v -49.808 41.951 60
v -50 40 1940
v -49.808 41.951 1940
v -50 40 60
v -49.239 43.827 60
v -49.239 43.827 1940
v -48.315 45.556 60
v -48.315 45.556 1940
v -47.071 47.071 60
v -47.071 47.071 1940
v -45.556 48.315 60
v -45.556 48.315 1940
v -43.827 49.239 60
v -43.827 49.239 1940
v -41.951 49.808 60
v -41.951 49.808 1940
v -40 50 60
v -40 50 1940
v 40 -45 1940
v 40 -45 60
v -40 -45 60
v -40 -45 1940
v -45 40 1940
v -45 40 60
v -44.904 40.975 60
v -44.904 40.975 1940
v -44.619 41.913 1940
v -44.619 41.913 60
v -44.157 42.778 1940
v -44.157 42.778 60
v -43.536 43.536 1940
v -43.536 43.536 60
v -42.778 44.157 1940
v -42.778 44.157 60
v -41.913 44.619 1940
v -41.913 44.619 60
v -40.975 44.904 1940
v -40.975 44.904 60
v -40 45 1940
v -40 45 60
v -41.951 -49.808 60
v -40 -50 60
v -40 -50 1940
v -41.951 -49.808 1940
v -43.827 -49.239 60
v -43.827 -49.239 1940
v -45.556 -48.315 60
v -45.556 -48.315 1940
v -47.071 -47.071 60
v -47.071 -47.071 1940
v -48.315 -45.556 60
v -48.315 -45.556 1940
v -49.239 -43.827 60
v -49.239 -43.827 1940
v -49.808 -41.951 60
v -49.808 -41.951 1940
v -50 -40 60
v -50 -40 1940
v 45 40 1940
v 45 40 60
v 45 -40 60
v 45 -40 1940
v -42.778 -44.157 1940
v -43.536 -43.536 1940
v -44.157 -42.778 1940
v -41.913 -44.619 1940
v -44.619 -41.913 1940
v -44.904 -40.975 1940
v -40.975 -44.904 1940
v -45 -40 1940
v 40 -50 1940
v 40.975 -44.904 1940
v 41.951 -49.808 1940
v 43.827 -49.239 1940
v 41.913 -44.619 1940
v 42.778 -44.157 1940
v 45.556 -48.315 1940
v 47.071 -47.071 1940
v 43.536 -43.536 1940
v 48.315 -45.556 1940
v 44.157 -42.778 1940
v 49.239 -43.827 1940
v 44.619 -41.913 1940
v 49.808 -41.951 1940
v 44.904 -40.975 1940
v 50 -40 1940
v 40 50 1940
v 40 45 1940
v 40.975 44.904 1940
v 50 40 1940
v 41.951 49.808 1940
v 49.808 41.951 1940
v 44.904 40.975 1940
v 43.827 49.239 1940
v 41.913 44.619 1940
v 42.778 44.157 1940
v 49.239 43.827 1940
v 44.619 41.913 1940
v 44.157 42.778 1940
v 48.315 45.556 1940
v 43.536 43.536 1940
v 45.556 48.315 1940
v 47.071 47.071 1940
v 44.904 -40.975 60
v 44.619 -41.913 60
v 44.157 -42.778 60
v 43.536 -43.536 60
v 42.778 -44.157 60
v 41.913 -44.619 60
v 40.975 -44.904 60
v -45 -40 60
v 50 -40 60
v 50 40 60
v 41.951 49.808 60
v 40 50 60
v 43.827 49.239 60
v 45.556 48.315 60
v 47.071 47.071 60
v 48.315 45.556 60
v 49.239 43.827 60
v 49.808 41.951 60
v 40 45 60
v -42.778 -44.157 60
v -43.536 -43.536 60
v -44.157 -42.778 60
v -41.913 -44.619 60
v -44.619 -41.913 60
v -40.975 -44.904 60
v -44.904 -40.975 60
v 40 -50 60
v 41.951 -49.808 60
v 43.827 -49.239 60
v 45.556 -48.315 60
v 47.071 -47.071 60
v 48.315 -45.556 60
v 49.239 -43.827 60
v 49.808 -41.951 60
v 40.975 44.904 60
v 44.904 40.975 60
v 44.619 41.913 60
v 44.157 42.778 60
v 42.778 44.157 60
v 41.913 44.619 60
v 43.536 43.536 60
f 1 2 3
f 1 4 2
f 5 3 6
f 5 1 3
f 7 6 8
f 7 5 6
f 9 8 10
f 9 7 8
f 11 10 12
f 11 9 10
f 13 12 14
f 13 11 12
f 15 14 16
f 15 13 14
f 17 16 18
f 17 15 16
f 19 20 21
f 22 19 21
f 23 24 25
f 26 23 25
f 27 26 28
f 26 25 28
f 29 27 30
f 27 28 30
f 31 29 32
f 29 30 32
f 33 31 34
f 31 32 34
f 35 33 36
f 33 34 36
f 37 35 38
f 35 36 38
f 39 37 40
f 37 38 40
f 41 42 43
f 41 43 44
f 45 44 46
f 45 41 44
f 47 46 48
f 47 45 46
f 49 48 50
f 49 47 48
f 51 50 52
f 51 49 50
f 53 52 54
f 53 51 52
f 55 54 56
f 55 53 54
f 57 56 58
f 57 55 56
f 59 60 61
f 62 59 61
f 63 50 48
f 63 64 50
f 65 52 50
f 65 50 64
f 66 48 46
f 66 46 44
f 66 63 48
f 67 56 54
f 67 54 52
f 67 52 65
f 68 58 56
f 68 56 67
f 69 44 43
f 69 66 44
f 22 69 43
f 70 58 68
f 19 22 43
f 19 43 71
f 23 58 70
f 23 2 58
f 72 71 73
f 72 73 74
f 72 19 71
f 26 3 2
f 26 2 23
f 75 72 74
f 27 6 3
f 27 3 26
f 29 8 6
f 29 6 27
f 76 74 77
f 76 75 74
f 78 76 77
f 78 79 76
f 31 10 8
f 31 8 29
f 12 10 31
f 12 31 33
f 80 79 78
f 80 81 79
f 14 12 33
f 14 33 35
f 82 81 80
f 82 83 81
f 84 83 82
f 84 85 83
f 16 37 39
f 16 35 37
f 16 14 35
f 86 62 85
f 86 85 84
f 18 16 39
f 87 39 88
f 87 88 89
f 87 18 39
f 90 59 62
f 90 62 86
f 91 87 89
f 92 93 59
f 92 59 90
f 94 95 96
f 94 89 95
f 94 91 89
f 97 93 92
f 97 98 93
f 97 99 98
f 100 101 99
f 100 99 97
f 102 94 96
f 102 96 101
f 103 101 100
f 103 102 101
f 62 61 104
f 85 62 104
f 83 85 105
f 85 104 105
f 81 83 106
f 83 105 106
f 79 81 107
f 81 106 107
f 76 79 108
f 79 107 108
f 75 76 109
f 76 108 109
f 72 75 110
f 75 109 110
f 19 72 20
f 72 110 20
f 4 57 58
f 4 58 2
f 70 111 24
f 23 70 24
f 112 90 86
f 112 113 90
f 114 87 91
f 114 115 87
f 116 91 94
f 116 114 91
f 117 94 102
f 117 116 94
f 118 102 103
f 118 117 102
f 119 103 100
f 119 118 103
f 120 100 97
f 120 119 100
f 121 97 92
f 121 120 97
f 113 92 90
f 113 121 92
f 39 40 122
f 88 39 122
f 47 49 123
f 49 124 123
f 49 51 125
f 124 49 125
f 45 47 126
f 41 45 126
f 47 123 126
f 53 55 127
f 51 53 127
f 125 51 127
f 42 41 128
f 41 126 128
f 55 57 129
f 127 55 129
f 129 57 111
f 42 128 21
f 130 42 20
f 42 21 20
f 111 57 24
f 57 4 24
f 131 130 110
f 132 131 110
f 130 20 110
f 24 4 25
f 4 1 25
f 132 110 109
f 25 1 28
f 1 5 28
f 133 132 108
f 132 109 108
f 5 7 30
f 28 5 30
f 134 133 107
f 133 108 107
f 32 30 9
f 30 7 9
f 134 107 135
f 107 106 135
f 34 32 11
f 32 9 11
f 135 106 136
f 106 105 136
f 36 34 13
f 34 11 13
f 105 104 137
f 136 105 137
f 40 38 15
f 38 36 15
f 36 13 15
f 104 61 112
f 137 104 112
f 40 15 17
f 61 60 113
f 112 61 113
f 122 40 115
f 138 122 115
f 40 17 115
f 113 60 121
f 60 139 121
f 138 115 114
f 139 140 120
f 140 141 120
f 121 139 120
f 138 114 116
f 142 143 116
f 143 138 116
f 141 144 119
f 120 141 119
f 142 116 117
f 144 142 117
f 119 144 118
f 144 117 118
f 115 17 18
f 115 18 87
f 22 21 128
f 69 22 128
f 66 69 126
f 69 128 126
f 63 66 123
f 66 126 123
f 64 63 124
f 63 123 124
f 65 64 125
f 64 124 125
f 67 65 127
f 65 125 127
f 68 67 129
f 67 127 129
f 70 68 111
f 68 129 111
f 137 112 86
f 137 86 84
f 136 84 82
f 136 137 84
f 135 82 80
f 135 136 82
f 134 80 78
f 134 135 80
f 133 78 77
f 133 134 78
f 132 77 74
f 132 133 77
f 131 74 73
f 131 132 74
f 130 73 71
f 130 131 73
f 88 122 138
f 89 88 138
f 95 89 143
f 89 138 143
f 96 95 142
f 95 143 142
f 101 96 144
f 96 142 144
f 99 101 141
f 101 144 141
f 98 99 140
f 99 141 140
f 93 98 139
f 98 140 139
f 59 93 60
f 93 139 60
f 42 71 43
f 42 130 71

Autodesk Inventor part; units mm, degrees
ref_plane "Start plane" through (0, 0, 60) normal (0, 0, 1) x (1, 0, 0)
ref_plane "End plane" through (0, 0, 1940) normal (0, 0, 1) x (1, 0, 0)
sketch "Sketch" plane through (0, 0, 0) normal (0, 0, 1) x (1, 0, 0)
  line L0 (-50, -40) -> (-50, 40)
  line L1 (-40, 50) -> (40, 50)
  line L2 (50, 40) -> (50, -40)
  line L3 (40, -50) -> (-40, -50)
  arc A0 (-50, -40) -> (-40, -50) centre (-40, -40) ccw
  arc A1 (50, 40) -> (40, 50) centre (40, 40) ccw
  arc A2 (-40, 50) -> (-50, 40) centre (-40, 40) ccw
  arc A3 (40, -50) -> (50, -40) centre (40, -40) ccw
  arc A4 (-40, 45) -> (-45, 40) centre (-40, 40) ccw
  line L4 (-40, 45) -> (40, 45)
  arc A5 (45, 40) -> (40, 45) centre (40, 40) ccw
  line L5 (45, 40) -> (45, -40)
  arc A6 (40, -45) -> (45, -40) centre (40, -40) ccw
  line L6 (40, -45) -> (-40, -45)
  arc A7 (-45, -40) -> (-40, -45) centre (-40, -40) ccw
  line L7 (-45, -40) -> (-45, 40)
  line L8 (0, 72.8995) -> (0, -72.8995) construction
  line L9 (-72.8995, 0) -> (72.8995, 0) construction
  dimension "d7" = 10
  dimension "d9" = 100
  dimension "d11" = 100
  dimension "d12" = 5
  dimension "d15" = 50
  dimension "d16" = 50
extrude "Body" add sketch "Sketch" along normal up to surface (1880 mm away) from surface at 60
sketch "Sketch3" plane through (0, 0, 0) normal (0, 0, 1) x (1, 0, 0)
  line L0 (0, 0) -> (10, 0)
ref_plane "Work Plane3" through (0, 0, 0) normal (0, -1, 0) x (1, 0, 0)
ref_plane "Work Plane4" through (-50, -150, 1940) normal (0, 0, 1) x (1, 0, 0)
split "Split1" plane through (-50, -150, 1940) removes the side toward (0, 0, 1)
ref_plane "Work Plane5" through (50, -150, 60) normal (0, 0, -1) x (-1, 0, 0)
split "Split2" plane through (50, -150, 60) removes the side toward (0, 0, -1)
sketch "Sketch4" plane through (0, 0, 0) normal (0, -1, 0) x (1, 0, 0)
  line L0 (-2, 60) -> (12, 60) projected
  line L1 (-2, 1940) -> (12, 1940) projected
  dimension "d18" = 1880
equation "\"d7\" = G_IR"
equation "\"d9\" = G_W"
equation "\"d11\" = G_H"
equation "\"d12\" = G_T"
equation "\"d15\" = 0.5 * d9"
equation "\"d16\" = 0.5 * d11"
equation "\"d3\" = G_L"
equation "\"G_W\" = 100"
equation "\"G_H\" = 100"
equation "\"G_T\" = 5"
equation "\"G_IR\" = 10"
equation "\"G_L\" = d18"
properties part number "ISO 10799-2 - 100x100x5 - 1880" material "Steel, Mild"
